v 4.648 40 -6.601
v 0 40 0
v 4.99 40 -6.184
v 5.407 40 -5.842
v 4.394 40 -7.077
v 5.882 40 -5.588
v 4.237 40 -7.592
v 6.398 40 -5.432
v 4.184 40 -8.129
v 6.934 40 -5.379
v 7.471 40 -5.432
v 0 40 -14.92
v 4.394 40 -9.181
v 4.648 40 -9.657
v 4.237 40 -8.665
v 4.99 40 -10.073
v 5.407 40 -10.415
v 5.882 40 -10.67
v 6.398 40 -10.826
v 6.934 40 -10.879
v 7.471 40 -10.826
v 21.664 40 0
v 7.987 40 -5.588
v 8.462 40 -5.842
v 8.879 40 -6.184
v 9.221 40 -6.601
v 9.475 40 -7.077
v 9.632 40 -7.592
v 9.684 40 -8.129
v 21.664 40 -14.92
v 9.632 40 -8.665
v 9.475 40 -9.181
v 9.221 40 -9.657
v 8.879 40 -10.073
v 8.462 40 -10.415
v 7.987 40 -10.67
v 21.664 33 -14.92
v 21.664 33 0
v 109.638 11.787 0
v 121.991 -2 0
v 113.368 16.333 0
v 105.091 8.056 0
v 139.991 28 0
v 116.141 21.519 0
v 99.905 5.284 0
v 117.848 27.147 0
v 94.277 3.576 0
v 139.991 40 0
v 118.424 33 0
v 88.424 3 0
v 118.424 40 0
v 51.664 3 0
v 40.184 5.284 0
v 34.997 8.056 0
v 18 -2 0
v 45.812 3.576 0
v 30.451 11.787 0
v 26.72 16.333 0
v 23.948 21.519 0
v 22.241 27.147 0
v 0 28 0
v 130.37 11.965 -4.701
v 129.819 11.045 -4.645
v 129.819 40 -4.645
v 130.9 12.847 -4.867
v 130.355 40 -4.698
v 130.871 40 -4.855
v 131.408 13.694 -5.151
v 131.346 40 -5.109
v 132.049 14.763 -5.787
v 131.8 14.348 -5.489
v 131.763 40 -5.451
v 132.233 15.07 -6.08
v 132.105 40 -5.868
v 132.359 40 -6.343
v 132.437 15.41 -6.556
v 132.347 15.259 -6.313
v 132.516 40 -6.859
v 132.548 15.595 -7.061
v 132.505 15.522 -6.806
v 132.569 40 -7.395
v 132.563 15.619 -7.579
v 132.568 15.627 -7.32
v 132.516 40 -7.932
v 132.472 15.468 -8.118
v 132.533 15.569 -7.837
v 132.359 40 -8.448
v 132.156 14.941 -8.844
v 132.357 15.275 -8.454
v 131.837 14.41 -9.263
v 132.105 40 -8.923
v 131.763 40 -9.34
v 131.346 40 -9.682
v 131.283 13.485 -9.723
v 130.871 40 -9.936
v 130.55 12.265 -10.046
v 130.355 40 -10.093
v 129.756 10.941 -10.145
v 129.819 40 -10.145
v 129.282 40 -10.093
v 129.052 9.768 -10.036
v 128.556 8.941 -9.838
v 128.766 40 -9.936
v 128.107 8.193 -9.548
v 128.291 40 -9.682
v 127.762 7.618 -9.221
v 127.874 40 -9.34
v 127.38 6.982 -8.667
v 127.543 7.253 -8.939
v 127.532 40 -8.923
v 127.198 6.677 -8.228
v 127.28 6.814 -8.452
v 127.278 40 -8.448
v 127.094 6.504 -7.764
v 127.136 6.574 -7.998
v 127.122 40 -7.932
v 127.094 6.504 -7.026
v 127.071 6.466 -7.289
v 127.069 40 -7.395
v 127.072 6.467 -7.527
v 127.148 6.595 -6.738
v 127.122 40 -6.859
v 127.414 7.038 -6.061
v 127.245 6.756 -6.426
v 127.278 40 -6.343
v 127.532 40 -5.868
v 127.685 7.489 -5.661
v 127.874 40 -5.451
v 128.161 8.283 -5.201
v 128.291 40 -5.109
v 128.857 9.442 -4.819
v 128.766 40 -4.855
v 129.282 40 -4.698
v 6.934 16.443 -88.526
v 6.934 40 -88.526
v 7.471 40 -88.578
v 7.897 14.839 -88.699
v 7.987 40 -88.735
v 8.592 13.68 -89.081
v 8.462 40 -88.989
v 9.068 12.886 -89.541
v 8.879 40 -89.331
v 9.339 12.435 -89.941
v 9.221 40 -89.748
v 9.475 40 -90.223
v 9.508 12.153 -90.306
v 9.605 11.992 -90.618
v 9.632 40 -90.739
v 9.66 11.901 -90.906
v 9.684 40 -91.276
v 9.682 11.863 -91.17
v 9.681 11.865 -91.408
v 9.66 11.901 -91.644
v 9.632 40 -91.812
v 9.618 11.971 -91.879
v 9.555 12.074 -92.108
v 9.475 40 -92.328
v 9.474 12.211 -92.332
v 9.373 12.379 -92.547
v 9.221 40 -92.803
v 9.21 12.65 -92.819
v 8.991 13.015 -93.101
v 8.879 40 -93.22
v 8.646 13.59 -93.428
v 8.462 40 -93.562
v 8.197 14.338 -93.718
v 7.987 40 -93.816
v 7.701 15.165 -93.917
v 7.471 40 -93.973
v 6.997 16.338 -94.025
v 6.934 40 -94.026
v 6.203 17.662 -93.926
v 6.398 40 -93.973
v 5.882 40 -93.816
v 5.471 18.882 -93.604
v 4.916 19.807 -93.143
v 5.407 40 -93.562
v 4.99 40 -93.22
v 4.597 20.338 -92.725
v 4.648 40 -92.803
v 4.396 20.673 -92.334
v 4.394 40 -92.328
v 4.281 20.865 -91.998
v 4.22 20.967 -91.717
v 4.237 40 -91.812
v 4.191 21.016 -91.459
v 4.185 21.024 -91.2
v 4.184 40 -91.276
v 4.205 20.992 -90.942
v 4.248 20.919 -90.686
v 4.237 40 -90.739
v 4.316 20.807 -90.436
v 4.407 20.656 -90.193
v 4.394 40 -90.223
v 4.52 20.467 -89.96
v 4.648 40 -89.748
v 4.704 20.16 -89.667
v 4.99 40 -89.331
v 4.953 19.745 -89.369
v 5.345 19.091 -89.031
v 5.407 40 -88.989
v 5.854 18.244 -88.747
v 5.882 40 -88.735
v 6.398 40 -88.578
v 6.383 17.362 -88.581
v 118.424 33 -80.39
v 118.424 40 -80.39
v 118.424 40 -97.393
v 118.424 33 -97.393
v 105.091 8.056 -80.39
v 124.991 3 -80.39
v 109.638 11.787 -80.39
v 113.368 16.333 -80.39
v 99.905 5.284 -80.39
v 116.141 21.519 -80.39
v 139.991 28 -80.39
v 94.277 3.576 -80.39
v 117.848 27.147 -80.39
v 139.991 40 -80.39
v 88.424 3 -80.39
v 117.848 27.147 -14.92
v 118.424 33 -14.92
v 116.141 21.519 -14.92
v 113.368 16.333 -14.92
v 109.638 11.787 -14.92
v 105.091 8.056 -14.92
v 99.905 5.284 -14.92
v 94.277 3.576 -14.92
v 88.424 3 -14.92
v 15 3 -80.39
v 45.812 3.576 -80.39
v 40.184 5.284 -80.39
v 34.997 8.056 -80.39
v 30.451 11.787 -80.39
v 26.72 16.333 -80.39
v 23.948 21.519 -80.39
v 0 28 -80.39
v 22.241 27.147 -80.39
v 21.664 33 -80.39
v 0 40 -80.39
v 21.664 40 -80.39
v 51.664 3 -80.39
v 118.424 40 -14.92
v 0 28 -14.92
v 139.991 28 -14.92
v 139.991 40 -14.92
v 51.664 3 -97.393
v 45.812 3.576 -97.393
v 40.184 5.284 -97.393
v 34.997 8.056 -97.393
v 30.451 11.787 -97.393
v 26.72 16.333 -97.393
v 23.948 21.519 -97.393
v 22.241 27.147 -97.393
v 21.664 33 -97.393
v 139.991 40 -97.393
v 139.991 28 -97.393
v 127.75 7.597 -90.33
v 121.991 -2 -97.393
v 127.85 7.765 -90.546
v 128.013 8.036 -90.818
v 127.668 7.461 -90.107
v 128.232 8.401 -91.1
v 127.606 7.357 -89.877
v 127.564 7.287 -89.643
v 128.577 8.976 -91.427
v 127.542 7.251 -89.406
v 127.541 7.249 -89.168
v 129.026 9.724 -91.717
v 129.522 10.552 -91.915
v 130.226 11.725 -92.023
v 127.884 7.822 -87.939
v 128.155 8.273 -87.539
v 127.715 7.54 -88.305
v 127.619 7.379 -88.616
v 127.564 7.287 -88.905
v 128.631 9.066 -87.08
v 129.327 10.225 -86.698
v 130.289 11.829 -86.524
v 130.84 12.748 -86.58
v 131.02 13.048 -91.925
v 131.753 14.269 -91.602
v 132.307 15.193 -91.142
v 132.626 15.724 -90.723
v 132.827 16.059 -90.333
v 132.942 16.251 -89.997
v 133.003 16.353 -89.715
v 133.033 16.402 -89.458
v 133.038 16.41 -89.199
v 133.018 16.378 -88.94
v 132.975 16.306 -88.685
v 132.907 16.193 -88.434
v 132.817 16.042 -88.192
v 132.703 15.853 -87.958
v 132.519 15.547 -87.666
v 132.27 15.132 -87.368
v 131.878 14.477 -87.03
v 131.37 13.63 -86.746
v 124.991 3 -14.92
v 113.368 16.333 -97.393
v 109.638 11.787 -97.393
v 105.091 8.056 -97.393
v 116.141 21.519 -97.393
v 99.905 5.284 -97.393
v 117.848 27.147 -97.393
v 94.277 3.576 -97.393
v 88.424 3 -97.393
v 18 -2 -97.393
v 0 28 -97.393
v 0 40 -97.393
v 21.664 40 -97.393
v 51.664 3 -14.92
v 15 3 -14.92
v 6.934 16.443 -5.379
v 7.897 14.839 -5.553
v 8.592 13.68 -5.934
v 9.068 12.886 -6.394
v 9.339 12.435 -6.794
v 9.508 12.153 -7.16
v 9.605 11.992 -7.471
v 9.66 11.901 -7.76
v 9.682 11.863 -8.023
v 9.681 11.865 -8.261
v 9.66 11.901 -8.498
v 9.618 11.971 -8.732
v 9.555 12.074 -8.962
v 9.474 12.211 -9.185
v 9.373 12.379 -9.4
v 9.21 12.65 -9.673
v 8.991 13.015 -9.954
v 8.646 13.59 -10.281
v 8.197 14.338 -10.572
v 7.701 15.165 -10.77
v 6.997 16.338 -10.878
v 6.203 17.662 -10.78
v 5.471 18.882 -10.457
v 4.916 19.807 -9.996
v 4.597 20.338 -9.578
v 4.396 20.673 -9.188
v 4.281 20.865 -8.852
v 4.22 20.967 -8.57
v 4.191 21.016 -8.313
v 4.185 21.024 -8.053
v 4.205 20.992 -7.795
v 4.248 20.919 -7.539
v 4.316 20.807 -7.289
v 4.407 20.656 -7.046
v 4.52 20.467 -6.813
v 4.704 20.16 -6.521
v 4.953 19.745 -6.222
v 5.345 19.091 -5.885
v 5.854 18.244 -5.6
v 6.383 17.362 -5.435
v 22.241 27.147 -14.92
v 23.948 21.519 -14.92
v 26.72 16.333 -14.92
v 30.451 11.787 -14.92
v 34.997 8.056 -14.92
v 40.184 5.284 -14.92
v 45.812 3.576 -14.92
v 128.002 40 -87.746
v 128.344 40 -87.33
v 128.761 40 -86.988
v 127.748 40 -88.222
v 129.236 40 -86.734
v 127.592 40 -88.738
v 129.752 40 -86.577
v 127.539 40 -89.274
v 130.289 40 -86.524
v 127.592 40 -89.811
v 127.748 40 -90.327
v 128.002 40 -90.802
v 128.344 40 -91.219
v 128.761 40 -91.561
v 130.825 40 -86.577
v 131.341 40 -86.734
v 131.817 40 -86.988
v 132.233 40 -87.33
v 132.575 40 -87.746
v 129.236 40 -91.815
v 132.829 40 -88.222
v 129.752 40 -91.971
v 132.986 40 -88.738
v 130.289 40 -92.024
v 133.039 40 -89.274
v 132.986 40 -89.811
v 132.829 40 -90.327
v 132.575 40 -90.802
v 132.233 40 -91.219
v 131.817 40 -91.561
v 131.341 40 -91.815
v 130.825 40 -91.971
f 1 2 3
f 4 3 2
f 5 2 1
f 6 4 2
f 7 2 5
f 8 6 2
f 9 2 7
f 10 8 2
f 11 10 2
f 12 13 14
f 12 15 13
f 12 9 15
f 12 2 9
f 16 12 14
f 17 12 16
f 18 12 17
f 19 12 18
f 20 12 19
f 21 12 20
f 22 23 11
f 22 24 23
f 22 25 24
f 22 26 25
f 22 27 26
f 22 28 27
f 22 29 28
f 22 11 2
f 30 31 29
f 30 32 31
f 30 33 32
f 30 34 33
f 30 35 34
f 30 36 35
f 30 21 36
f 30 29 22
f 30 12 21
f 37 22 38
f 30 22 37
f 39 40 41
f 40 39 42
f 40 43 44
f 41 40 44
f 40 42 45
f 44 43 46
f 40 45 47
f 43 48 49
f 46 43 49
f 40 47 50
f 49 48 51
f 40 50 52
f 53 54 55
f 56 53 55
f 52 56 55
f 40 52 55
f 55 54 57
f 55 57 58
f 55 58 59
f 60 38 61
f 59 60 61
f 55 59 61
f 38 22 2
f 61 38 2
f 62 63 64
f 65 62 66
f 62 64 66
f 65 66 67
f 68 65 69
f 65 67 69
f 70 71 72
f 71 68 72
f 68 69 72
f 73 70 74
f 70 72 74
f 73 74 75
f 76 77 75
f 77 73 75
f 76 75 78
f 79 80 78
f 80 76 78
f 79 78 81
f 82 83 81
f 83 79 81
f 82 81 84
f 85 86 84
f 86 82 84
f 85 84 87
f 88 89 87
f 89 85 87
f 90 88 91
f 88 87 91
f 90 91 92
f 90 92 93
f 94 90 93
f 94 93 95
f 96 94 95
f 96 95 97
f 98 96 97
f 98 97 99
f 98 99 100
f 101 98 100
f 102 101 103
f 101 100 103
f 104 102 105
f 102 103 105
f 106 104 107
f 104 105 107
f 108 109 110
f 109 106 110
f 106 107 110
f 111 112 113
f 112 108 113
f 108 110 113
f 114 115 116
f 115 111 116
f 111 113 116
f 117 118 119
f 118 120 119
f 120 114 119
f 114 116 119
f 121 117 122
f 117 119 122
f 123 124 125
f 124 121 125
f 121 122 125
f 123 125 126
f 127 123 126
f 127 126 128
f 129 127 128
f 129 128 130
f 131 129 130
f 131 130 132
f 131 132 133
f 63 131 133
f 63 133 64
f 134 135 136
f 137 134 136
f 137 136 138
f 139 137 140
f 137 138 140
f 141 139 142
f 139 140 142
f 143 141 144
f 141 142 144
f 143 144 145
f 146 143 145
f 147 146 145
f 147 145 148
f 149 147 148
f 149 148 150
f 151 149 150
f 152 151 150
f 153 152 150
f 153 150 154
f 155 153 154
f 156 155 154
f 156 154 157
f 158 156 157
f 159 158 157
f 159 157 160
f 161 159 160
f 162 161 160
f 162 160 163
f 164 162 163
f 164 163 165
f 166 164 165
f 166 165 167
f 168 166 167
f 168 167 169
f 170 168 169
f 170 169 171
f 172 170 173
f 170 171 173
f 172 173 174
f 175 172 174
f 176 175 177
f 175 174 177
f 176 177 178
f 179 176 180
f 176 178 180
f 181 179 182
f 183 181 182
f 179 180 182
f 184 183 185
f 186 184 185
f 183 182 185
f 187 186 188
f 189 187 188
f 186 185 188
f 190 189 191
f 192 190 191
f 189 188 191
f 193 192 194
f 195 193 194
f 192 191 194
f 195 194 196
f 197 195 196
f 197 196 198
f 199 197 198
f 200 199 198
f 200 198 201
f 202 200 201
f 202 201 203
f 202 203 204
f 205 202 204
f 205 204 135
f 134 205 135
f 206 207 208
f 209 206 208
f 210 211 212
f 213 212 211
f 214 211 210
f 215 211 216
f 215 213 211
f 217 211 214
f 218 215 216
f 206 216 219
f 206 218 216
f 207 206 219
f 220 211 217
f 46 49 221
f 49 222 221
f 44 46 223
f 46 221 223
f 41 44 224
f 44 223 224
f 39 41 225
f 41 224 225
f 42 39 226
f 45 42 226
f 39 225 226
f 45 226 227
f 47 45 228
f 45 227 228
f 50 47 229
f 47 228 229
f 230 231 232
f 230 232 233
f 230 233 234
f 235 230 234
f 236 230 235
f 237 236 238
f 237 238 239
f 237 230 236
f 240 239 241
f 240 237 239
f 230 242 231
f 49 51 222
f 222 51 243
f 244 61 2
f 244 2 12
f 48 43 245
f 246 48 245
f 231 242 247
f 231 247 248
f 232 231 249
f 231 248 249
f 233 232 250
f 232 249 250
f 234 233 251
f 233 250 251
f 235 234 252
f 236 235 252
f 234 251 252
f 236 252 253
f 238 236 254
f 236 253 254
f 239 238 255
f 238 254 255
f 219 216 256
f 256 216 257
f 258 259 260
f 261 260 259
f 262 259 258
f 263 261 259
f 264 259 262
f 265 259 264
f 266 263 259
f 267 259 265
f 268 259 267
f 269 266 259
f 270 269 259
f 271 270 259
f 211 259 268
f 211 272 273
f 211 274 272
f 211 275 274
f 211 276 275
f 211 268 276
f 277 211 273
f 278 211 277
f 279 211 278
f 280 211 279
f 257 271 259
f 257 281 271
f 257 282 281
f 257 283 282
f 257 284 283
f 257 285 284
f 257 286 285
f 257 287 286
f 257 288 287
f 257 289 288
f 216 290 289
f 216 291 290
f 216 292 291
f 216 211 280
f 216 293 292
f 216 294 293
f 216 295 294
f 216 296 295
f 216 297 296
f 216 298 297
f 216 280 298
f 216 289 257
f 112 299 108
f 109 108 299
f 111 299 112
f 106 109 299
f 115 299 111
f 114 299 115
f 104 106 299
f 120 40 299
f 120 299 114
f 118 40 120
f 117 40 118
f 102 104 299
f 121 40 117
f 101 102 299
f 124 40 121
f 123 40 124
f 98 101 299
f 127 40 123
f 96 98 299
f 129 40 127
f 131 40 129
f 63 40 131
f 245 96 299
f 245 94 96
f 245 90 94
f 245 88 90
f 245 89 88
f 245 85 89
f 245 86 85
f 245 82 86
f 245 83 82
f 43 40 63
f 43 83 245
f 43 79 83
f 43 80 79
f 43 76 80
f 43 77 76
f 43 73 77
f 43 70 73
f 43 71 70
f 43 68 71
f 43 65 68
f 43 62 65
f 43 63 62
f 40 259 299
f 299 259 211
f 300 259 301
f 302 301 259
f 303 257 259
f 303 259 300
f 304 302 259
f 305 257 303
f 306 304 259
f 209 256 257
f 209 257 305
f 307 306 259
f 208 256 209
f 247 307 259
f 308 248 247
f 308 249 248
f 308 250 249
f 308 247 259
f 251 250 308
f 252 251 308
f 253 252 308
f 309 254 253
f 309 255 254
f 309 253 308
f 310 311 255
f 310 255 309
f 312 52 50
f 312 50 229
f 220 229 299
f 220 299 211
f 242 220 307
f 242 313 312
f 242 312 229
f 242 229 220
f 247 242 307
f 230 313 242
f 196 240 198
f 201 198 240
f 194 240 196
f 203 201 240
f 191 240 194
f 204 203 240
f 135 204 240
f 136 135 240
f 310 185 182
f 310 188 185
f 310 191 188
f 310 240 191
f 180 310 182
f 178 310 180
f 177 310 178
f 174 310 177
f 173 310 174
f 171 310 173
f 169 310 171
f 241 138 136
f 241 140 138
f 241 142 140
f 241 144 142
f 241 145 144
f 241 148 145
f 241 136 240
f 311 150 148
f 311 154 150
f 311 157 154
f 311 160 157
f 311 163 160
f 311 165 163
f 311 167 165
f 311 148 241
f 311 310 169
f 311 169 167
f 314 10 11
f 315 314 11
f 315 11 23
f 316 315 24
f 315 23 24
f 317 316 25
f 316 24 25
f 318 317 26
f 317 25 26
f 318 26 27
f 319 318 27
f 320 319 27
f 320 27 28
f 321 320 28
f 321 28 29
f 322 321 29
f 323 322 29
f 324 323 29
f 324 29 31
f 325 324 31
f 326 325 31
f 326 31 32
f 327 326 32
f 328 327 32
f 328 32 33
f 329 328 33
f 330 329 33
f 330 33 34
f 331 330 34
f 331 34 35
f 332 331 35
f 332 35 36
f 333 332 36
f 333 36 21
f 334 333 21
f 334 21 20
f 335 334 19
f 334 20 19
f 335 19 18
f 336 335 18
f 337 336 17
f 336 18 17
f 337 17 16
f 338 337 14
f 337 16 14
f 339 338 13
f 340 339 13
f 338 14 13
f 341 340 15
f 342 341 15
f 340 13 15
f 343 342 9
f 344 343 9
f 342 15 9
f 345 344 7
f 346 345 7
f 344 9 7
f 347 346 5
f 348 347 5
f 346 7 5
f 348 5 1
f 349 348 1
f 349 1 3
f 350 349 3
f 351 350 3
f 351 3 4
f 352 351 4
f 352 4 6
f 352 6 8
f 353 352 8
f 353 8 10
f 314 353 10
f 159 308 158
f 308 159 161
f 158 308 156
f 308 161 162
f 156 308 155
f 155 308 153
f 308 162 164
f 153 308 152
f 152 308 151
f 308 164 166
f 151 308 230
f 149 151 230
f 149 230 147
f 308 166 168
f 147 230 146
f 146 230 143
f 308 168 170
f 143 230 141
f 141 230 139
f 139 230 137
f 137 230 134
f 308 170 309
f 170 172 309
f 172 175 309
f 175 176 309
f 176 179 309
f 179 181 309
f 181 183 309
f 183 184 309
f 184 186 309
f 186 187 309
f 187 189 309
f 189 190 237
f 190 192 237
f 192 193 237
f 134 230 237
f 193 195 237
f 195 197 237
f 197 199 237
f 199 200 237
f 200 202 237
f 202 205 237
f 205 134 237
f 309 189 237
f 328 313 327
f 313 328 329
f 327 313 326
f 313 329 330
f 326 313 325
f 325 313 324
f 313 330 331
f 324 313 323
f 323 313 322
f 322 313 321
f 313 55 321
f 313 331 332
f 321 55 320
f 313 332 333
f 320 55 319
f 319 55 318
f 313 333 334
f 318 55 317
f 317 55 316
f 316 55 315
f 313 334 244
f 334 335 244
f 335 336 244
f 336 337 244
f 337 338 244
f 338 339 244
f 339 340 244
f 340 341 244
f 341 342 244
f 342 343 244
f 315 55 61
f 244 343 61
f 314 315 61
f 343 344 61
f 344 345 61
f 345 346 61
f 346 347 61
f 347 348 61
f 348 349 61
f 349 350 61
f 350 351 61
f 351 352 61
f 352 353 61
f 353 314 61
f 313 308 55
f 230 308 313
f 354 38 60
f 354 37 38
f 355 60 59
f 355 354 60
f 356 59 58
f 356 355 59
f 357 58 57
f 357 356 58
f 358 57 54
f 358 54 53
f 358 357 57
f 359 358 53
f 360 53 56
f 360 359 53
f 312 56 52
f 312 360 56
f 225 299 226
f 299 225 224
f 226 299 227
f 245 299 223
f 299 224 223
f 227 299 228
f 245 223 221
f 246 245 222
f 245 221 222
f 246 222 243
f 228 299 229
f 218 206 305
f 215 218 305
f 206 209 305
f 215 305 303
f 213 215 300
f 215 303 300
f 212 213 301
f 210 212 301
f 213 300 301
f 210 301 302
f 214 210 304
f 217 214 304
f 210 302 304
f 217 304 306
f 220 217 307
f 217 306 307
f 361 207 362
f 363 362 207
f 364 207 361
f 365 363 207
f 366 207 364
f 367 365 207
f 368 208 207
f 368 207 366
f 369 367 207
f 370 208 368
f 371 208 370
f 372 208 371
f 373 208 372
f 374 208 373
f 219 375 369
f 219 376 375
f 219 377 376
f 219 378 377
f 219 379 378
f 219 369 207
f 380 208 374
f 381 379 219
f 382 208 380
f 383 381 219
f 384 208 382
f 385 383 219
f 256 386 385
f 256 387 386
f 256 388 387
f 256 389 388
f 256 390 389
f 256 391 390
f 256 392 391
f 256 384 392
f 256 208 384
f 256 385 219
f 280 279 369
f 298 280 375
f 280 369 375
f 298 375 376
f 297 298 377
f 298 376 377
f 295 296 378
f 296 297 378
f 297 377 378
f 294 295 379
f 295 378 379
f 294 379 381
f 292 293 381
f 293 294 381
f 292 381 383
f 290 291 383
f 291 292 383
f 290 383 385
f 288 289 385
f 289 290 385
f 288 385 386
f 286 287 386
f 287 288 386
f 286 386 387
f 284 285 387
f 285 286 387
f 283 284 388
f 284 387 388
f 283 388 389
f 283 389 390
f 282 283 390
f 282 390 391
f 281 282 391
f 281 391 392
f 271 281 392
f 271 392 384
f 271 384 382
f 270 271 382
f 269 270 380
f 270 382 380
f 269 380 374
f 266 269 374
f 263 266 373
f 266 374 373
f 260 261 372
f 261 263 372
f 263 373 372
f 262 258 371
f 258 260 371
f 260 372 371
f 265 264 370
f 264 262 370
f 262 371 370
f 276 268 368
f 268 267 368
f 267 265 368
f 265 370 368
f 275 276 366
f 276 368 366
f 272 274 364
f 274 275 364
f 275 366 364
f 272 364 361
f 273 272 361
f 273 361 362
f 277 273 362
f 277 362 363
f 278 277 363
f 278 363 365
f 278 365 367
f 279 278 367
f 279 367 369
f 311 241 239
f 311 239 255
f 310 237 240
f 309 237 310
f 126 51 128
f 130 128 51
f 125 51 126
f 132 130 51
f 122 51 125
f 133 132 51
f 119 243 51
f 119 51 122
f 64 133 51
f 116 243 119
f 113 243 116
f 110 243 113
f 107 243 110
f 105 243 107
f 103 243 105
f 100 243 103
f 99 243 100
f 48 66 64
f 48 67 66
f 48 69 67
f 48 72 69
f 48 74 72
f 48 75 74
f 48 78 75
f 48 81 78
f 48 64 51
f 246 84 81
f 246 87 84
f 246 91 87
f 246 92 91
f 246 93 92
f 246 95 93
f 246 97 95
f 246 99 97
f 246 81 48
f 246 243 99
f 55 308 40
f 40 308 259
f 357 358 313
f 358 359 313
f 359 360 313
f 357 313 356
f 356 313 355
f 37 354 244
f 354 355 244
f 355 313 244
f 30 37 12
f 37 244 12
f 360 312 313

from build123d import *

# Parameters (mm, degrees)
PICOVER_DEPTH                       = 40
PICOVER_DEPTH_BACK                  = 2
SKETCH1_W                           = 139.991389113
SKETCH1_H                           = 97.393342316
SKETCH2_W                           = 96.759944342
SKETCH2_H                           = 98.11966003
OPENINGFORPI_DEPTH                  = 37
SKETCH4_W                           = 18
SKETCH4_H                           = 97.393342316
CUTAWAYSTHATDEFINESCREWPLATES_DEPTH = 30
BOSS_EXTRUDE1_DEPTH                 = 97.393342316
HOLEFORPOWERHDMIAUDIO_DEPTH         = 150
HOLEFORPOWERHDMIAUDIO_DEPTH_BACK    = 30
SKETCH6_W                           = 65.470403297
SKETCH6_H                           = 37
SKETCH7_R                           = 2.75
CUT_EXTRUDE7_DEPTH                  = 60
FILLET1_R                           = 30
FILLET2_R                           = 30
FILLET3_R                           = 30
FILLET4_R                           = 30


with BuildPart() as part:
    # Sketch1 → PiCover (new, two sides: drawn at the far end of the back side and taken through both)
    with BuildSketch(Plane(origin=(0, 0, 0), x_dir=(1, 0, 0), z_dir=(0, 1, 0)).offset(-PICOVER_DEPTH_BACK)):
        with Locations((69.995694556, 48.696671158)):
            Rectangle(SKETCH1_W, SKETCH1_H)
    extrude(amount=PICOVER_DEPTH + PICOVER_DEPTH_BACK)

    # Sketch2 → OpeningForPi (cut)
    with BuildSketch(Plane(origin=(0, 40, 0), x_dir=(1, 0, 0), z_dir=(0, 1, 0))):
        with Locations((70.044375284, 48.333512301)):
            Rectangle(SKETCH2_W, SKETCH2_H)
    extrude(amount=-OPENINGFORPI_DEPTH, mode=Mode.SUBTRACT)

    # Sketch4 → CutAwaysThatDefineScrewPlates (cut)
    with BuildSketch(Plane.XZ.offset(2)):
        with Locations((130.991389113, -48.696671158)):
            Rectangle(SKETCH4_W, SKETCH4_H)
        with Locations((9, -48.696671158)):
            Rectangle(SKETCH4_W, SKETCH4_H)
    extrude(amount=-CUTAWAYSTHATDEFINESCREWPLATES_DEPTH, mode=Mode.SUBTRACT)

    # Sketch11 → Boss-Extrude1 (add)
    with BuildSketch(Plane.XY):
        Polygon((0, 28), (18, 28), (18, -2), align=None)
        Polygon((139.991389113, 28), (121.991389113, 28), (121.991389113, -2), align=None)
    extrude(amount=-BOSS_EXTRUDE1_DEPTH)

    # Sketch6 → HoleForPowerHDMIAudio (cut, two sides: drawn at the far end of the back side and taken through both)
    with BuildSketch(Plane(origin=(21.664403113, 0, 0), x_dir=(0, 0, -1), z_dir=(1, 0, 0)).offset(-HOLEFORPOWERHDMIAUDIO_DEPTH_BACK)):
        with Locations((47.655232797, 21.5)):
            Rectangle(SKETCH6_W, SKETCH6_H)
    extrude(amount=HOLEFORPOWERHDMIAUDIO_DEPTH + HOLEFORPOWERHDMIAUDIO_DEPTH_BACK, mode=Mode.SUBTRACT)

    # Sketch7 → Cut-Extrude7 (cut)
    with BuildSketch(Plane(origin=(0, 40, 0), x_dir=(1, 0, 0), z_dir=(0, 1, 0))):
        with Locations(Location((6.934452889, 8.128892452, 0), (0, 0, 270))):
            Circle(SKETCH7_R)
        with Locations(Location((6.934452889, 91.275593332, 0), (0, 0, 270))):
            Circle(SKETCH7_R)
        with Locations(Location((130.288718206, 89.274198859, 0), (0, 0, 270))):
            Circle(SKETCH7_R)
        with Locations(Location((129.818664093, 7.39541328, 0), (0, 0, 270))):
            Circle(SKETCH7_R)
    extrude(amount=-CUT_EXTRUDE7_DEPTH, mode=Mode.SUBTRACT)

    # Fillet1
    fillet1_edges = [part.edges().sort_by_distance(p)[0] for p in [
        (21.664403113, 3, -88.891888381),
    ]]
    fillet(fillet1_edges, radius=FILLET1_R)

    # Fillet2
    fillet2_edges = [part.edges().sort_by_distance(p)[0] for p in [
        (118.424347455, 3, -88.891888381),
    ]]
    fillet(fillet2_edges, radius=FILLET2_R)

    # Fillet3
    fillet3_edges = [part.edges().sort_by_distance(p)[0] for p in [
        (21.664403113, 3, -7.460015574),
    ]]
    fillet(fillet3_edges, radius=FILLET3_R)

    # Fillet4
    fillet4_edges = [part.edges().sort_by_distance(p)[0] for p in [
        (118.424347455, 3, -7.460015574),
    ]]
    fillet(fillet4_edges, radius=FILLET4_R)


solid = part.part
